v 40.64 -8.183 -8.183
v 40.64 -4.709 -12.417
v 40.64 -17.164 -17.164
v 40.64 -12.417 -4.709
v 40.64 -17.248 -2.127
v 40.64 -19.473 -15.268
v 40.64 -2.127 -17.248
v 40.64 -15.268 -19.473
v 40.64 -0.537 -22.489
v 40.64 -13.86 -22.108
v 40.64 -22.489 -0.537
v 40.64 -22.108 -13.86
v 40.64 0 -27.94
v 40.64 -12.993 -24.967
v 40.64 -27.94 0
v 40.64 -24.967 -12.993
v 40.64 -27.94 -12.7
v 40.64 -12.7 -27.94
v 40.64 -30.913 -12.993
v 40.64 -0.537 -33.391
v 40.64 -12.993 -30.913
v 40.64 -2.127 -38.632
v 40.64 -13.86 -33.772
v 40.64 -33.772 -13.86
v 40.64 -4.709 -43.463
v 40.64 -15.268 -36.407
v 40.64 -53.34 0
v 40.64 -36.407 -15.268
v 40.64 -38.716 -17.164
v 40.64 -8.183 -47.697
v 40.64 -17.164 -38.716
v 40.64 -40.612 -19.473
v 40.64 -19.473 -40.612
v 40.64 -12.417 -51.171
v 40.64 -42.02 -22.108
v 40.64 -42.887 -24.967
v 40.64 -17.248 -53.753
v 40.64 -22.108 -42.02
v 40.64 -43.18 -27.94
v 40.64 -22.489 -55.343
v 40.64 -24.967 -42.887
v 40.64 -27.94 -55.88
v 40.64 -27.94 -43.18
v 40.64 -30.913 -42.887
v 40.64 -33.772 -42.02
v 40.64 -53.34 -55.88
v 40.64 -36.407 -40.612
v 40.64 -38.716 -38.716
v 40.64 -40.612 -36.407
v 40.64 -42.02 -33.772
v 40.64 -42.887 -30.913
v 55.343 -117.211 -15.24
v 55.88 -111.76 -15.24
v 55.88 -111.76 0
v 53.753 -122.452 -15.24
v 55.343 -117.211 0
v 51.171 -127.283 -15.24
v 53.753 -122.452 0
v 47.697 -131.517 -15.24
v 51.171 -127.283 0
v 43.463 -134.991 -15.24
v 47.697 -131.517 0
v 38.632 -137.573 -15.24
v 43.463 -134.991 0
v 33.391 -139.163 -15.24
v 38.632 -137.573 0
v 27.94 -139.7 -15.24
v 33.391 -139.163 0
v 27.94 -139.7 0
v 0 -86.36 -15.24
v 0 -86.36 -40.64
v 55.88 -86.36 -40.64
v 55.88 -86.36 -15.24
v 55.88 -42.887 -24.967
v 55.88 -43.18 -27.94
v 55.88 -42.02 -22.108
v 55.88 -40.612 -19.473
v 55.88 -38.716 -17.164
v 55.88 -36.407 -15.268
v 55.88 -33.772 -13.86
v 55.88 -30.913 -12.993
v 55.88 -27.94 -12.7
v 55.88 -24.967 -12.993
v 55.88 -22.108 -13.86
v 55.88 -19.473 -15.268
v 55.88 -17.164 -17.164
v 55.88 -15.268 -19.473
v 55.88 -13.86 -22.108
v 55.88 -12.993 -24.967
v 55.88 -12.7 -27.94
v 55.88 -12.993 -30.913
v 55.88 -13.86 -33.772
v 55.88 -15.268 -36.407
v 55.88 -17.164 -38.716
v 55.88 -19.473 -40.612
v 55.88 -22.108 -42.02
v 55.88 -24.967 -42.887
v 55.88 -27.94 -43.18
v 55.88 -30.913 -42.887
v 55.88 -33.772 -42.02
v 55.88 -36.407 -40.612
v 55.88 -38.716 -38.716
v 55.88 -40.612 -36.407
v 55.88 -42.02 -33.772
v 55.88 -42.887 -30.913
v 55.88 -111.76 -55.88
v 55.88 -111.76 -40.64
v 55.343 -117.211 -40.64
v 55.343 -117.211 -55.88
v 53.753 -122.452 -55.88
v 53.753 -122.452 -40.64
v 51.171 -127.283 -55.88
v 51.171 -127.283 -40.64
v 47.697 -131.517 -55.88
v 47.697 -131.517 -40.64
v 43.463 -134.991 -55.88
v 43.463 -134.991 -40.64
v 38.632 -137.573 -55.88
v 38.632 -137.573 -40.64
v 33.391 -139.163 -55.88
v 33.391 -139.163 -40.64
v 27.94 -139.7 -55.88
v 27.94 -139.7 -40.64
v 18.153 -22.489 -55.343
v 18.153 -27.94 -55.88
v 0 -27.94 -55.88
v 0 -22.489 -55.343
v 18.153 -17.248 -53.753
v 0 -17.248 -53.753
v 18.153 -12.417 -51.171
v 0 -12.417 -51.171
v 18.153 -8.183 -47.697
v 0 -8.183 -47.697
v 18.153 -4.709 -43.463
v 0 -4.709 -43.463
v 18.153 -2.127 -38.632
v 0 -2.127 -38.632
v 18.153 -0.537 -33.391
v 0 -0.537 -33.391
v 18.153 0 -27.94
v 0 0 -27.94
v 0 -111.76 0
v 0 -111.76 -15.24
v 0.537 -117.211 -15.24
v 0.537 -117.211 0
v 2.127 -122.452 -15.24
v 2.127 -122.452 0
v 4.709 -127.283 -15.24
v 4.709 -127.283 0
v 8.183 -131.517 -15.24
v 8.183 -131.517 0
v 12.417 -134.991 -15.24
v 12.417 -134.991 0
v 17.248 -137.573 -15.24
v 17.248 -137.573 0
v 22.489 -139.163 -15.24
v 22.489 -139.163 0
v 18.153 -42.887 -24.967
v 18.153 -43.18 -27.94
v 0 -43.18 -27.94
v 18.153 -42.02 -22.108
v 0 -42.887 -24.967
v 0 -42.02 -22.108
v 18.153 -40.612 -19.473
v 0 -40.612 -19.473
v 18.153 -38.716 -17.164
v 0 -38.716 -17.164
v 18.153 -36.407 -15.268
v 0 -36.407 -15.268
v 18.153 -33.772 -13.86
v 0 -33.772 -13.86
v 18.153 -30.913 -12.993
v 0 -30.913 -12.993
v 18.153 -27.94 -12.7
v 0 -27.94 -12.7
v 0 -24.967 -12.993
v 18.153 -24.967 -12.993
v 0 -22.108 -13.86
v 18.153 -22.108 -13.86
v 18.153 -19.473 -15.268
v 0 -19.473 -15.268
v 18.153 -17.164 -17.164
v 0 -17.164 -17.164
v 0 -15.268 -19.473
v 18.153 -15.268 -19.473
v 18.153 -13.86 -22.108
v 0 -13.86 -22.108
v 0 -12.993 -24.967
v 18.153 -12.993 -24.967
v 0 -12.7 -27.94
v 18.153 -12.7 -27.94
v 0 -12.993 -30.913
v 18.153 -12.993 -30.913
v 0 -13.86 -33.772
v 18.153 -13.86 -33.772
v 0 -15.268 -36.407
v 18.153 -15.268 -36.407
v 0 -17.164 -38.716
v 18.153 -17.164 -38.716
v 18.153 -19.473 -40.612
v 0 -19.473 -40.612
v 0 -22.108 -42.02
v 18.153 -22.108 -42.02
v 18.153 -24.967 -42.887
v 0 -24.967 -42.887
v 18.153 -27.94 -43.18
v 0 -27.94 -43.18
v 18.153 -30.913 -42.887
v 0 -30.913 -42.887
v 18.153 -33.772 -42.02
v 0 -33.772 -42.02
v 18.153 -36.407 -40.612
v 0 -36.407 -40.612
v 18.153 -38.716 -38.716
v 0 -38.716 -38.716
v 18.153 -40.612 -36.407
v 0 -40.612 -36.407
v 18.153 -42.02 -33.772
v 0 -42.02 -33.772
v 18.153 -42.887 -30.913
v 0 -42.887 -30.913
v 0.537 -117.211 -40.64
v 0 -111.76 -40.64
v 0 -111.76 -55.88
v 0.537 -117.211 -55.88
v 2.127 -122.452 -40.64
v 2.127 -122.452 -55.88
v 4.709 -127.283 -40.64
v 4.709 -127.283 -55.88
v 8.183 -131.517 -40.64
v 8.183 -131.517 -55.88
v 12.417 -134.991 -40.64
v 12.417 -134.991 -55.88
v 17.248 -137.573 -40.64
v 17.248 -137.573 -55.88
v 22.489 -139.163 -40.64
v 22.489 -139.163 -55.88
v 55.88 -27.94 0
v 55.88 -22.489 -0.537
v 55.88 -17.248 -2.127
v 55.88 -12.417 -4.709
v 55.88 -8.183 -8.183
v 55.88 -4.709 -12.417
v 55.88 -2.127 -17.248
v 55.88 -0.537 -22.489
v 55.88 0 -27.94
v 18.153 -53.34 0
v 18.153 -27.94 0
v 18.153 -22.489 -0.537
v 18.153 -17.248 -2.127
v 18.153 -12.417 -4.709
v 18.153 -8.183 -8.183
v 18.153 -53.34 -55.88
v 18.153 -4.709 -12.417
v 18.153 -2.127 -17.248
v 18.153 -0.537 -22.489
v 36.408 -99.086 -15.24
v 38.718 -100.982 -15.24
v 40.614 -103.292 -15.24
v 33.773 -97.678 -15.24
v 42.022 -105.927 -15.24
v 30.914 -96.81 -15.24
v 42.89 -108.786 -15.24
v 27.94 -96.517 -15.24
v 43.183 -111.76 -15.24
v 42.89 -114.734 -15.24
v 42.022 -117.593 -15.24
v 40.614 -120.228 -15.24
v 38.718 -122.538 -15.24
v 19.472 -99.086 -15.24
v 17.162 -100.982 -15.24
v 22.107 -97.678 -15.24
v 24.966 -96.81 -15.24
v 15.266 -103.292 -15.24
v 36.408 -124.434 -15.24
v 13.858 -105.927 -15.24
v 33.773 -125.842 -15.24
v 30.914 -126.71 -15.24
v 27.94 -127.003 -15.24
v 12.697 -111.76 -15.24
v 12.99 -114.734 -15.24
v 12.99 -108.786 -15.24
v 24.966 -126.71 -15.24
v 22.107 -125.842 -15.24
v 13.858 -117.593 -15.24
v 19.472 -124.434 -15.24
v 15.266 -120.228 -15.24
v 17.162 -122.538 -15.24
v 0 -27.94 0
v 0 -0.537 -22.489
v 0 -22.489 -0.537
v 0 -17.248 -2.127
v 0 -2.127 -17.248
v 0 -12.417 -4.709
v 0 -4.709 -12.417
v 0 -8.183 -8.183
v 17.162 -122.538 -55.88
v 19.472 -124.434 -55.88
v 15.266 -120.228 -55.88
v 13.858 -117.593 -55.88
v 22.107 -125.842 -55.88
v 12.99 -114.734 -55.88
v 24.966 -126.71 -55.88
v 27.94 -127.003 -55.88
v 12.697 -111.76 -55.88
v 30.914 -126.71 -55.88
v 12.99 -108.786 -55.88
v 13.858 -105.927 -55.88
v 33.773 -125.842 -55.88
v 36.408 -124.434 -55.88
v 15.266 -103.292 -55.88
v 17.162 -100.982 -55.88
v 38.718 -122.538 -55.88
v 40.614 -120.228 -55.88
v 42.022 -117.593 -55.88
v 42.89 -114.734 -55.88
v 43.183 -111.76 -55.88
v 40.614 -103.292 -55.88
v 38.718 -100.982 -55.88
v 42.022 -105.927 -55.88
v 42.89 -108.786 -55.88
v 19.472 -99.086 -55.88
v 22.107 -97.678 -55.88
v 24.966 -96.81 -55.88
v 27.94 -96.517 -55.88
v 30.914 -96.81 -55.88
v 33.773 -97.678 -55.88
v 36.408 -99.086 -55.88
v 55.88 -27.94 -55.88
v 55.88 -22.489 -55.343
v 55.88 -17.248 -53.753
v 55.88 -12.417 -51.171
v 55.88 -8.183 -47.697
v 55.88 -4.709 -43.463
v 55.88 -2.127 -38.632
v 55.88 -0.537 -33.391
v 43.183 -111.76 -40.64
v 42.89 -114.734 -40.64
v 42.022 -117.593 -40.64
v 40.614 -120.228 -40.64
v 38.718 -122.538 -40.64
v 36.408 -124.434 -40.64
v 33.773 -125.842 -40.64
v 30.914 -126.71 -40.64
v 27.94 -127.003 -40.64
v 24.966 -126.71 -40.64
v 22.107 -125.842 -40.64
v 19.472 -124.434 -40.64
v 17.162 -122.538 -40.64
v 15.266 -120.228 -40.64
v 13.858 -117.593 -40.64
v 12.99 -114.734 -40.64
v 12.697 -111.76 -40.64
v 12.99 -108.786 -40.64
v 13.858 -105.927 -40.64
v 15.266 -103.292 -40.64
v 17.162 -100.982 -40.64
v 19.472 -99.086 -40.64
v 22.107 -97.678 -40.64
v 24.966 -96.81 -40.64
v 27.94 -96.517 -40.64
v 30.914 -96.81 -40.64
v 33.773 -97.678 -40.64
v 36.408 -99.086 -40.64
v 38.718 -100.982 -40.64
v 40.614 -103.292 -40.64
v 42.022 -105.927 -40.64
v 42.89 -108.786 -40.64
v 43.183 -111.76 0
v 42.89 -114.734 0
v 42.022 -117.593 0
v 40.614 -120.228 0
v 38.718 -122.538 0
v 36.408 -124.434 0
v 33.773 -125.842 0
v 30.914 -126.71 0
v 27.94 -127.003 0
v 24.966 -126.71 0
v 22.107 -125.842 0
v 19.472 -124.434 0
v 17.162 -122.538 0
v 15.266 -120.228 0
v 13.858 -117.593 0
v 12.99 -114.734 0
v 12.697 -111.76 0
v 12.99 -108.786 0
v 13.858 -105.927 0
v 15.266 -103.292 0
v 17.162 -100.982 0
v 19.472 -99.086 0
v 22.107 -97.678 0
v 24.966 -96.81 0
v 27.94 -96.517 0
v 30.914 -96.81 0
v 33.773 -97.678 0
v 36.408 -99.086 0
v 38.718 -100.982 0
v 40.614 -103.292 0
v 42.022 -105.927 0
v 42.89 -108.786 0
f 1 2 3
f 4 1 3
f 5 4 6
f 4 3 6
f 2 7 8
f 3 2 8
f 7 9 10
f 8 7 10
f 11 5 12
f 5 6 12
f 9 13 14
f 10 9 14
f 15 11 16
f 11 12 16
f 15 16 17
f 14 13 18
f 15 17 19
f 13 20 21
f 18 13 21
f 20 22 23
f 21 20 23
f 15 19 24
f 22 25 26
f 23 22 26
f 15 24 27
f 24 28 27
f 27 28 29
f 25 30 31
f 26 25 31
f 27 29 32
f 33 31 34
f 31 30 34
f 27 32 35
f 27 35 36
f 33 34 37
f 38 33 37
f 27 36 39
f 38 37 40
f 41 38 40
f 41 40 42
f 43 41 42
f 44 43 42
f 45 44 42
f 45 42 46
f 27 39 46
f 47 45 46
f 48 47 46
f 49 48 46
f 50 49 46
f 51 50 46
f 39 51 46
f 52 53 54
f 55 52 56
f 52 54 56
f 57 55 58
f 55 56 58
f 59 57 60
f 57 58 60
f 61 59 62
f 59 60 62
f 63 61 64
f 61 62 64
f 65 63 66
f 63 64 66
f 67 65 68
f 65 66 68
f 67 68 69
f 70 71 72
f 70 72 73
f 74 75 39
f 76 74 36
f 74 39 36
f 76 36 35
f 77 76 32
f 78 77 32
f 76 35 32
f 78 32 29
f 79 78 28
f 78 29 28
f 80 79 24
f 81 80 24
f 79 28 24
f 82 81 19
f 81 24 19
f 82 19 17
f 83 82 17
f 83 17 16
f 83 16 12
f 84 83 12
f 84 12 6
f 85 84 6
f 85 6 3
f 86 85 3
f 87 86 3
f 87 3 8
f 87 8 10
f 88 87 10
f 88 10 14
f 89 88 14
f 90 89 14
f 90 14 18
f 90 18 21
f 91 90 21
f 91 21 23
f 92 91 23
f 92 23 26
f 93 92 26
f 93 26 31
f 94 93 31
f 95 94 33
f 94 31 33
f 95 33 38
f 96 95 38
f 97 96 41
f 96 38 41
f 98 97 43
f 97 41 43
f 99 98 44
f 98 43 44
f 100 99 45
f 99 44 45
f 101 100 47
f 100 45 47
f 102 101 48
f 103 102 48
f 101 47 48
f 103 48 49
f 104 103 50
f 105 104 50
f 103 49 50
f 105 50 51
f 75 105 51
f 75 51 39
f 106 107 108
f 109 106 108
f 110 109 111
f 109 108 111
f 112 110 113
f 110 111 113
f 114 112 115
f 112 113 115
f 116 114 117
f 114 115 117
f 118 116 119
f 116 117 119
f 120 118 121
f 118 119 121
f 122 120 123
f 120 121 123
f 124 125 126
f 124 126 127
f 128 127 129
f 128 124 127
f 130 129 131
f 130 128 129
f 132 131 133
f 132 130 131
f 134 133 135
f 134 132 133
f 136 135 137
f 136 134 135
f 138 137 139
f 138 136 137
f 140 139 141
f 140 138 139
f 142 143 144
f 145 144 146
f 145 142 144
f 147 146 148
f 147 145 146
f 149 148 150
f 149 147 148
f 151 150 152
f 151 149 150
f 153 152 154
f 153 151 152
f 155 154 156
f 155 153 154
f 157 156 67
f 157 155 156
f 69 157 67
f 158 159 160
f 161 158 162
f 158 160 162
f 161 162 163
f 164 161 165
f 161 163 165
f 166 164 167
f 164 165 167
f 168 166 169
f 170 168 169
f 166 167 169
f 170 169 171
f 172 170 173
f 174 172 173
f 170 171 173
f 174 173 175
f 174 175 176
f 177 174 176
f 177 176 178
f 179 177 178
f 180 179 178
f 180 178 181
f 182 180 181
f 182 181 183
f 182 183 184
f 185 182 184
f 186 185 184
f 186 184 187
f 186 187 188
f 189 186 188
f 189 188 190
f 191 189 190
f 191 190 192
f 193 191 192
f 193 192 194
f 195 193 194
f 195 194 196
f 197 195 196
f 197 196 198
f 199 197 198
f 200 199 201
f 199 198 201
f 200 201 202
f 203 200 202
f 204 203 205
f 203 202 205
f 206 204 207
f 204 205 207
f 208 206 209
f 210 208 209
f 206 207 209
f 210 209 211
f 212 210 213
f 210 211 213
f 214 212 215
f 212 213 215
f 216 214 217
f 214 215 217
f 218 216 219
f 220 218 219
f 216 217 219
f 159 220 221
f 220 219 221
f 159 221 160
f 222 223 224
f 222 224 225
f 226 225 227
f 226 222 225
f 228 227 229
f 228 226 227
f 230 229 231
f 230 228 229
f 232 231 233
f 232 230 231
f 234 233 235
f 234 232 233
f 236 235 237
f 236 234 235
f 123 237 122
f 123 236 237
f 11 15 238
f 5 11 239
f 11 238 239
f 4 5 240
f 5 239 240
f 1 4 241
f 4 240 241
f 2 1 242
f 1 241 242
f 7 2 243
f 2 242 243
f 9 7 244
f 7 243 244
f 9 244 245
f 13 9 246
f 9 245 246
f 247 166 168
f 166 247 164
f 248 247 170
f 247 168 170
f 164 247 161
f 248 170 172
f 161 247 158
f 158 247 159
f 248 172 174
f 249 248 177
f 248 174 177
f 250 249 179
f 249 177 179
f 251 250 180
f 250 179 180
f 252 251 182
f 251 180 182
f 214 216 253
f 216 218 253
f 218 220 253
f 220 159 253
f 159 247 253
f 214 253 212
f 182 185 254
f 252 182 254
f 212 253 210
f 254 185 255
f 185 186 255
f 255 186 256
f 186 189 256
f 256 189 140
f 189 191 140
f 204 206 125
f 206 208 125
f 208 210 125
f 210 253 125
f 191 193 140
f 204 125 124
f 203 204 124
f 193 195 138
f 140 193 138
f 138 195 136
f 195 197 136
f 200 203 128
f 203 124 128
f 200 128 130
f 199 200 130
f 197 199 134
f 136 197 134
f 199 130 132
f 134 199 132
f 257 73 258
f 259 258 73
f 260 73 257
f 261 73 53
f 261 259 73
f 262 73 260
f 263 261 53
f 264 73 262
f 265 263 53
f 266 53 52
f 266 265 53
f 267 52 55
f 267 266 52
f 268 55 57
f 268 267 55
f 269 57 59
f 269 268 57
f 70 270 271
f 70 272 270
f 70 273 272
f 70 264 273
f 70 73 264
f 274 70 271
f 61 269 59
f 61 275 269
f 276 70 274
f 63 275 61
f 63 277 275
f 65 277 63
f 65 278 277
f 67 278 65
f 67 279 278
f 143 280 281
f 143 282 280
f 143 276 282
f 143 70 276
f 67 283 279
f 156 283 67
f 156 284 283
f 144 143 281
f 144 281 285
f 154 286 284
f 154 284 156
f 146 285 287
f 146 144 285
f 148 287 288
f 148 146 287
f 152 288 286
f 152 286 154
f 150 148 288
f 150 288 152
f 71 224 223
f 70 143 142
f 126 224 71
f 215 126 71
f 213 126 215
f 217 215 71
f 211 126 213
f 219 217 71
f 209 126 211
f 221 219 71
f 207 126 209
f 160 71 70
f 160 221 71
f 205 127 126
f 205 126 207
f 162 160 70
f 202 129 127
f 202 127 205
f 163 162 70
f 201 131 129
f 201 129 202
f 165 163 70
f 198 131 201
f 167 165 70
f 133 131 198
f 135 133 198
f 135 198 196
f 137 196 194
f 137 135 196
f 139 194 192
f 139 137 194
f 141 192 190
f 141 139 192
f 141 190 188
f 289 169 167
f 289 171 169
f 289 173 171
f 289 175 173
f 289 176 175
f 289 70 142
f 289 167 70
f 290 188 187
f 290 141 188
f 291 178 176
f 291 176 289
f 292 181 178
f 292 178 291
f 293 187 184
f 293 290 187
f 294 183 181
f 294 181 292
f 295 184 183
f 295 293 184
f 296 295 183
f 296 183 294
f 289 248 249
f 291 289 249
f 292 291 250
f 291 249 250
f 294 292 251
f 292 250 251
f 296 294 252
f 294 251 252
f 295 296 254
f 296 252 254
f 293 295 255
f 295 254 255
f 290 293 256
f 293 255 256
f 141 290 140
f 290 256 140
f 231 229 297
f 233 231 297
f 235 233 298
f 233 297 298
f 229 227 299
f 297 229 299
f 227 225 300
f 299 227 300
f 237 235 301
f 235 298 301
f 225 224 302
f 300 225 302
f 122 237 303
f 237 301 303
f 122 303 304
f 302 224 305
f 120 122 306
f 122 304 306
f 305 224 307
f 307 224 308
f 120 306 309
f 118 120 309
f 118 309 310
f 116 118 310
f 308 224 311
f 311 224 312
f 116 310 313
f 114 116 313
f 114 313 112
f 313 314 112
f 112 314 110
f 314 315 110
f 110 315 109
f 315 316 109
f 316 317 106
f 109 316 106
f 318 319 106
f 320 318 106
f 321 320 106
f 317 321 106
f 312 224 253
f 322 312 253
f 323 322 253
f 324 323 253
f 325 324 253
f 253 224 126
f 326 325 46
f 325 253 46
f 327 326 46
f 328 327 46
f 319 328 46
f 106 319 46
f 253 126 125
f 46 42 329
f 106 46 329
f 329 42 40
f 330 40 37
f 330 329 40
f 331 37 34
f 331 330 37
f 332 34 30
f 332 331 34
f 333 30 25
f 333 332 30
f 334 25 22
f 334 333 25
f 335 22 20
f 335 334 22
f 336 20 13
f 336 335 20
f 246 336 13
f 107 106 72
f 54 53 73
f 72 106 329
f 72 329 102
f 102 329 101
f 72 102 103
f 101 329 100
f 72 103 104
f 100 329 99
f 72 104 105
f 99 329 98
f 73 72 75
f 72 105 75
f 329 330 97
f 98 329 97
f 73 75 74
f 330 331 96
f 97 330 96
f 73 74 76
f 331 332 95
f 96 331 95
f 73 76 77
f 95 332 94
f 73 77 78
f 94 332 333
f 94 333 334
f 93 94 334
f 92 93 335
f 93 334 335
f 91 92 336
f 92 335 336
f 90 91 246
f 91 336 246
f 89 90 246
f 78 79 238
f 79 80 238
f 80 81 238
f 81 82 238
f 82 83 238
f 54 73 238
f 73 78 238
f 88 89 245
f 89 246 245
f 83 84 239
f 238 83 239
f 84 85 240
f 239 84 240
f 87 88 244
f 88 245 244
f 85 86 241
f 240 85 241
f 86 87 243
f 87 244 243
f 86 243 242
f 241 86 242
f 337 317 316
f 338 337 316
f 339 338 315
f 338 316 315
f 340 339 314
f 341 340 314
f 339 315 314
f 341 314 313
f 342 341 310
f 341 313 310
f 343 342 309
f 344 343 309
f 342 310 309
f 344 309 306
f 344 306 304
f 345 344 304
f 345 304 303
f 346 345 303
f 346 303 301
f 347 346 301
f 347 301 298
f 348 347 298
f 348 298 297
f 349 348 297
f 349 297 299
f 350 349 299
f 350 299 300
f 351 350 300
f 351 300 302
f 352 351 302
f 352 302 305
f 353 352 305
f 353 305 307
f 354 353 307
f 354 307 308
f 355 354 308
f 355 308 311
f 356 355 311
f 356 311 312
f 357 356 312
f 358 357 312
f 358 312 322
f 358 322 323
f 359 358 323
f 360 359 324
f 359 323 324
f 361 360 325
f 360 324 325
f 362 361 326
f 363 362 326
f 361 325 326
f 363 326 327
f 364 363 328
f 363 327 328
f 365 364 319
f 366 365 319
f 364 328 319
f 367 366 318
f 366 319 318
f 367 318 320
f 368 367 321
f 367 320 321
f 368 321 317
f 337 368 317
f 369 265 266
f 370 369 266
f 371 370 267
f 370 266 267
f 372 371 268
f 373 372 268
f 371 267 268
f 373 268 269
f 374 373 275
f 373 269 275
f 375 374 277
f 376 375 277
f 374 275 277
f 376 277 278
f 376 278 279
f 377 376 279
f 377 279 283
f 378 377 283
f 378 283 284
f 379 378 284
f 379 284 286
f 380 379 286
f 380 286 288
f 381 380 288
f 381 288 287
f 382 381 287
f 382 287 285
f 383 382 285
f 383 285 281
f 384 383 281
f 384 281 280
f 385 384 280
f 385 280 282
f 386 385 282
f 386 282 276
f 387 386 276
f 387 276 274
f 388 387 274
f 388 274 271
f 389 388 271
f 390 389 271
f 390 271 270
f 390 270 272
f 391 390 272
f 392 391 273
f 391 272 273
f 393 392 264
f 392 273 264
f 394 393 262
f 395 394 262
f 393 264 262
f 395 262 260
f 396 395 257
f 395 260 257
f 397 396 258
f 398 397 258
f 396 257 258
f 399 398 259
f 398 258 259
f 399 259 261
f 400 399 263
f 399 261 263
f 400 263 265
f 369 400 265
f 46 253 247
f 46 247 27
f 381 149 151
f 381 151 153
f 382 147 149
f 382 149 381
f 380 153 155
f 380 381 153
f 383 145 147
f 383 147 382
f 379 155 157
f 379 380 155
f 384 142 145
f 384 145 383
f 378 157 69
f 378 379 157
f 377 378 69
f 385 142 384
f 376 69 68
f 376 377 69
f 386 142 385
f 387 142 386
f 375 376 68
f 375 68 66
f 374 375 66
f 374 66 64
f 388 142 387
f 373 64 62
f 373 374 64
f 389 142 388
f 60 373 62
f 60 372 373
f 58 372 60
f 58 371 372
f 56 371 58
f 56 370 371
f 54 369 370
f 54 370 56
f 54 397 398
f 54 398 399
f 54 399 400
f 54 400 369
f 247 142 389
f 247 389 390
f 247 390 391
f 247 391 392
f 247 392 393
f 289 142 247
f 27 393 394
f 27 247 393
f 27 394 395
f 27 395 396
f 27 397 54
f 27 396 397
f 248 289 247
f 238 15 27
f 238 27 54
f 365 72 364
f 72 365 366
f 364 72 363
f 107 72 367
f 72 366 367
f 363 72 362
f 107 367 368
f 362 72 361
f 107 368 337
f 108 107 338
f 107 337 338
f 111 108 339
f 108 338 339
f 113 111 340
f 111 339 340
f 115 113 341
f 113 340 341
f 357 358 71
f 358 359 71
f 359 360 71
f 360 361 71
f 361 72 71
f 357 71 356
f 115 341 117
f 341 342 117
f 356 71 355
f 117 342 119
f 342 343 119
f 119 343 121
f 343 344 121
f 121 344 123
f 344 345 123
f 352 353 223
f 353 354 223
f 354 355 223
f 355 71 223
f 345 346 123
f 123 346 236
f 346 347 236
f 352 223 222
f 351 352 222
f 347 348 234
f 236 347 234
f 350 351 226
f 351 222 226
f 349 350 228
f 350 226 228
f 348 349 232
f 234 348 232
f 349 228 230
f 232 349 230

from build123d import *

# Parameters (mm, degrees)
F0_W      = 55.88
F0_H      = 55.88
F1_DEPTH  = 139.7
F2_R      = 27.93999
F3_W      = 22.4871877581
F3_H      = 35.5748719843
F3_H_2    = 25.40001
F4_DEPTH  = 55.881
F5_R      = 15.24
F6_DEPTH  = 55.881
F7_W      = 84.3253175833
F7_H      = 25.4
F8_DEPTH  = 55.881
F9_R      = 15.2425635054
F10_DEPTH = 55.881


# Not quite as in the source:
# - a fillet or chamfer is up to 0.001 mm smaller than in the source, because OpenCascade refuses the exact size
# - a feature names something its author has since deleted; it is built from what else it names


with BuildPart() as f1:
    # F0 (on Front) → F1 (new body)
    with BuildSketch(Plane.XZ):
        with Locations((27.94, -27.94)):
            Rectangle(F0_W, F0_H)
    extrude(amount=F1_DEPTH)

    # F2 (radius 27.94 in the source; OpenCascade refuses exactly that, so slightly less here)
    f2_edges = [f1.edges().sort_by_distance(p)[0] for p in [
        (0, -139.7, -27.94),
        (27.94, 0, 0),
        (27.94, 0, -55.88),
        (55.88, -139.7, -27.94),
    ]]
    fillet(f2_edges, radius=F2_R)

    # F3 (on face) → F4 (cut, through all)
    with BuildSketch(Plane(origin=(0, 0, -55.88), x_dir=(1, 0, 0), z_dir=(0, 0, -1))):
        with Locations((29.396406121, 10.1525540079)):
            Rectangle(F3_W, F3_H)
        with Locations((29.396406121, 40.639995)):
            Rectangle(F3_W, F3_H_2)
    extrude(amount=-F4_DEPTH, mode=Mode.SUBTRACT)

    # F5 (on face) → F6 (cut, through all)
    with BuildSketch(Plane(origin=(0, 0, 0), x_dir=(0, -1, 0), z_dir=(-1, 0, 0))):
        with Locations((27.94, -27.94)):
            Circle(F5_R)
    extrude(amount=-F6_DEPTH, mode=Mode.SUBTRACT)

    # F7 (on face) → F8 (cut, through all)
    with BuildSketch(Plane(origin=(0, 0, 0), x_dir=(0, -1, 0), z_dir=(-1, 0, 0))):
        with Locations((128.5226587916, -27.94)):
            Rectangle(F7_W, F7_H)
    extrude(amount=-F8_DEPTH, mode=Mode.SUBTRACT)

    # F9 (on face) → F10 (cut, through all)
    with BuildSketch(Plane(origin=(0, 0, -55.88), x_dir=(1, 0, 0), z_dir=(0, 0, -1))):
        with Locations((27.94, 111.76)):
            Circle(F9_R)
    extrude(amount=-F10_DEPTH, mode=Mode.SUBTRACT)


solid = f1.part
